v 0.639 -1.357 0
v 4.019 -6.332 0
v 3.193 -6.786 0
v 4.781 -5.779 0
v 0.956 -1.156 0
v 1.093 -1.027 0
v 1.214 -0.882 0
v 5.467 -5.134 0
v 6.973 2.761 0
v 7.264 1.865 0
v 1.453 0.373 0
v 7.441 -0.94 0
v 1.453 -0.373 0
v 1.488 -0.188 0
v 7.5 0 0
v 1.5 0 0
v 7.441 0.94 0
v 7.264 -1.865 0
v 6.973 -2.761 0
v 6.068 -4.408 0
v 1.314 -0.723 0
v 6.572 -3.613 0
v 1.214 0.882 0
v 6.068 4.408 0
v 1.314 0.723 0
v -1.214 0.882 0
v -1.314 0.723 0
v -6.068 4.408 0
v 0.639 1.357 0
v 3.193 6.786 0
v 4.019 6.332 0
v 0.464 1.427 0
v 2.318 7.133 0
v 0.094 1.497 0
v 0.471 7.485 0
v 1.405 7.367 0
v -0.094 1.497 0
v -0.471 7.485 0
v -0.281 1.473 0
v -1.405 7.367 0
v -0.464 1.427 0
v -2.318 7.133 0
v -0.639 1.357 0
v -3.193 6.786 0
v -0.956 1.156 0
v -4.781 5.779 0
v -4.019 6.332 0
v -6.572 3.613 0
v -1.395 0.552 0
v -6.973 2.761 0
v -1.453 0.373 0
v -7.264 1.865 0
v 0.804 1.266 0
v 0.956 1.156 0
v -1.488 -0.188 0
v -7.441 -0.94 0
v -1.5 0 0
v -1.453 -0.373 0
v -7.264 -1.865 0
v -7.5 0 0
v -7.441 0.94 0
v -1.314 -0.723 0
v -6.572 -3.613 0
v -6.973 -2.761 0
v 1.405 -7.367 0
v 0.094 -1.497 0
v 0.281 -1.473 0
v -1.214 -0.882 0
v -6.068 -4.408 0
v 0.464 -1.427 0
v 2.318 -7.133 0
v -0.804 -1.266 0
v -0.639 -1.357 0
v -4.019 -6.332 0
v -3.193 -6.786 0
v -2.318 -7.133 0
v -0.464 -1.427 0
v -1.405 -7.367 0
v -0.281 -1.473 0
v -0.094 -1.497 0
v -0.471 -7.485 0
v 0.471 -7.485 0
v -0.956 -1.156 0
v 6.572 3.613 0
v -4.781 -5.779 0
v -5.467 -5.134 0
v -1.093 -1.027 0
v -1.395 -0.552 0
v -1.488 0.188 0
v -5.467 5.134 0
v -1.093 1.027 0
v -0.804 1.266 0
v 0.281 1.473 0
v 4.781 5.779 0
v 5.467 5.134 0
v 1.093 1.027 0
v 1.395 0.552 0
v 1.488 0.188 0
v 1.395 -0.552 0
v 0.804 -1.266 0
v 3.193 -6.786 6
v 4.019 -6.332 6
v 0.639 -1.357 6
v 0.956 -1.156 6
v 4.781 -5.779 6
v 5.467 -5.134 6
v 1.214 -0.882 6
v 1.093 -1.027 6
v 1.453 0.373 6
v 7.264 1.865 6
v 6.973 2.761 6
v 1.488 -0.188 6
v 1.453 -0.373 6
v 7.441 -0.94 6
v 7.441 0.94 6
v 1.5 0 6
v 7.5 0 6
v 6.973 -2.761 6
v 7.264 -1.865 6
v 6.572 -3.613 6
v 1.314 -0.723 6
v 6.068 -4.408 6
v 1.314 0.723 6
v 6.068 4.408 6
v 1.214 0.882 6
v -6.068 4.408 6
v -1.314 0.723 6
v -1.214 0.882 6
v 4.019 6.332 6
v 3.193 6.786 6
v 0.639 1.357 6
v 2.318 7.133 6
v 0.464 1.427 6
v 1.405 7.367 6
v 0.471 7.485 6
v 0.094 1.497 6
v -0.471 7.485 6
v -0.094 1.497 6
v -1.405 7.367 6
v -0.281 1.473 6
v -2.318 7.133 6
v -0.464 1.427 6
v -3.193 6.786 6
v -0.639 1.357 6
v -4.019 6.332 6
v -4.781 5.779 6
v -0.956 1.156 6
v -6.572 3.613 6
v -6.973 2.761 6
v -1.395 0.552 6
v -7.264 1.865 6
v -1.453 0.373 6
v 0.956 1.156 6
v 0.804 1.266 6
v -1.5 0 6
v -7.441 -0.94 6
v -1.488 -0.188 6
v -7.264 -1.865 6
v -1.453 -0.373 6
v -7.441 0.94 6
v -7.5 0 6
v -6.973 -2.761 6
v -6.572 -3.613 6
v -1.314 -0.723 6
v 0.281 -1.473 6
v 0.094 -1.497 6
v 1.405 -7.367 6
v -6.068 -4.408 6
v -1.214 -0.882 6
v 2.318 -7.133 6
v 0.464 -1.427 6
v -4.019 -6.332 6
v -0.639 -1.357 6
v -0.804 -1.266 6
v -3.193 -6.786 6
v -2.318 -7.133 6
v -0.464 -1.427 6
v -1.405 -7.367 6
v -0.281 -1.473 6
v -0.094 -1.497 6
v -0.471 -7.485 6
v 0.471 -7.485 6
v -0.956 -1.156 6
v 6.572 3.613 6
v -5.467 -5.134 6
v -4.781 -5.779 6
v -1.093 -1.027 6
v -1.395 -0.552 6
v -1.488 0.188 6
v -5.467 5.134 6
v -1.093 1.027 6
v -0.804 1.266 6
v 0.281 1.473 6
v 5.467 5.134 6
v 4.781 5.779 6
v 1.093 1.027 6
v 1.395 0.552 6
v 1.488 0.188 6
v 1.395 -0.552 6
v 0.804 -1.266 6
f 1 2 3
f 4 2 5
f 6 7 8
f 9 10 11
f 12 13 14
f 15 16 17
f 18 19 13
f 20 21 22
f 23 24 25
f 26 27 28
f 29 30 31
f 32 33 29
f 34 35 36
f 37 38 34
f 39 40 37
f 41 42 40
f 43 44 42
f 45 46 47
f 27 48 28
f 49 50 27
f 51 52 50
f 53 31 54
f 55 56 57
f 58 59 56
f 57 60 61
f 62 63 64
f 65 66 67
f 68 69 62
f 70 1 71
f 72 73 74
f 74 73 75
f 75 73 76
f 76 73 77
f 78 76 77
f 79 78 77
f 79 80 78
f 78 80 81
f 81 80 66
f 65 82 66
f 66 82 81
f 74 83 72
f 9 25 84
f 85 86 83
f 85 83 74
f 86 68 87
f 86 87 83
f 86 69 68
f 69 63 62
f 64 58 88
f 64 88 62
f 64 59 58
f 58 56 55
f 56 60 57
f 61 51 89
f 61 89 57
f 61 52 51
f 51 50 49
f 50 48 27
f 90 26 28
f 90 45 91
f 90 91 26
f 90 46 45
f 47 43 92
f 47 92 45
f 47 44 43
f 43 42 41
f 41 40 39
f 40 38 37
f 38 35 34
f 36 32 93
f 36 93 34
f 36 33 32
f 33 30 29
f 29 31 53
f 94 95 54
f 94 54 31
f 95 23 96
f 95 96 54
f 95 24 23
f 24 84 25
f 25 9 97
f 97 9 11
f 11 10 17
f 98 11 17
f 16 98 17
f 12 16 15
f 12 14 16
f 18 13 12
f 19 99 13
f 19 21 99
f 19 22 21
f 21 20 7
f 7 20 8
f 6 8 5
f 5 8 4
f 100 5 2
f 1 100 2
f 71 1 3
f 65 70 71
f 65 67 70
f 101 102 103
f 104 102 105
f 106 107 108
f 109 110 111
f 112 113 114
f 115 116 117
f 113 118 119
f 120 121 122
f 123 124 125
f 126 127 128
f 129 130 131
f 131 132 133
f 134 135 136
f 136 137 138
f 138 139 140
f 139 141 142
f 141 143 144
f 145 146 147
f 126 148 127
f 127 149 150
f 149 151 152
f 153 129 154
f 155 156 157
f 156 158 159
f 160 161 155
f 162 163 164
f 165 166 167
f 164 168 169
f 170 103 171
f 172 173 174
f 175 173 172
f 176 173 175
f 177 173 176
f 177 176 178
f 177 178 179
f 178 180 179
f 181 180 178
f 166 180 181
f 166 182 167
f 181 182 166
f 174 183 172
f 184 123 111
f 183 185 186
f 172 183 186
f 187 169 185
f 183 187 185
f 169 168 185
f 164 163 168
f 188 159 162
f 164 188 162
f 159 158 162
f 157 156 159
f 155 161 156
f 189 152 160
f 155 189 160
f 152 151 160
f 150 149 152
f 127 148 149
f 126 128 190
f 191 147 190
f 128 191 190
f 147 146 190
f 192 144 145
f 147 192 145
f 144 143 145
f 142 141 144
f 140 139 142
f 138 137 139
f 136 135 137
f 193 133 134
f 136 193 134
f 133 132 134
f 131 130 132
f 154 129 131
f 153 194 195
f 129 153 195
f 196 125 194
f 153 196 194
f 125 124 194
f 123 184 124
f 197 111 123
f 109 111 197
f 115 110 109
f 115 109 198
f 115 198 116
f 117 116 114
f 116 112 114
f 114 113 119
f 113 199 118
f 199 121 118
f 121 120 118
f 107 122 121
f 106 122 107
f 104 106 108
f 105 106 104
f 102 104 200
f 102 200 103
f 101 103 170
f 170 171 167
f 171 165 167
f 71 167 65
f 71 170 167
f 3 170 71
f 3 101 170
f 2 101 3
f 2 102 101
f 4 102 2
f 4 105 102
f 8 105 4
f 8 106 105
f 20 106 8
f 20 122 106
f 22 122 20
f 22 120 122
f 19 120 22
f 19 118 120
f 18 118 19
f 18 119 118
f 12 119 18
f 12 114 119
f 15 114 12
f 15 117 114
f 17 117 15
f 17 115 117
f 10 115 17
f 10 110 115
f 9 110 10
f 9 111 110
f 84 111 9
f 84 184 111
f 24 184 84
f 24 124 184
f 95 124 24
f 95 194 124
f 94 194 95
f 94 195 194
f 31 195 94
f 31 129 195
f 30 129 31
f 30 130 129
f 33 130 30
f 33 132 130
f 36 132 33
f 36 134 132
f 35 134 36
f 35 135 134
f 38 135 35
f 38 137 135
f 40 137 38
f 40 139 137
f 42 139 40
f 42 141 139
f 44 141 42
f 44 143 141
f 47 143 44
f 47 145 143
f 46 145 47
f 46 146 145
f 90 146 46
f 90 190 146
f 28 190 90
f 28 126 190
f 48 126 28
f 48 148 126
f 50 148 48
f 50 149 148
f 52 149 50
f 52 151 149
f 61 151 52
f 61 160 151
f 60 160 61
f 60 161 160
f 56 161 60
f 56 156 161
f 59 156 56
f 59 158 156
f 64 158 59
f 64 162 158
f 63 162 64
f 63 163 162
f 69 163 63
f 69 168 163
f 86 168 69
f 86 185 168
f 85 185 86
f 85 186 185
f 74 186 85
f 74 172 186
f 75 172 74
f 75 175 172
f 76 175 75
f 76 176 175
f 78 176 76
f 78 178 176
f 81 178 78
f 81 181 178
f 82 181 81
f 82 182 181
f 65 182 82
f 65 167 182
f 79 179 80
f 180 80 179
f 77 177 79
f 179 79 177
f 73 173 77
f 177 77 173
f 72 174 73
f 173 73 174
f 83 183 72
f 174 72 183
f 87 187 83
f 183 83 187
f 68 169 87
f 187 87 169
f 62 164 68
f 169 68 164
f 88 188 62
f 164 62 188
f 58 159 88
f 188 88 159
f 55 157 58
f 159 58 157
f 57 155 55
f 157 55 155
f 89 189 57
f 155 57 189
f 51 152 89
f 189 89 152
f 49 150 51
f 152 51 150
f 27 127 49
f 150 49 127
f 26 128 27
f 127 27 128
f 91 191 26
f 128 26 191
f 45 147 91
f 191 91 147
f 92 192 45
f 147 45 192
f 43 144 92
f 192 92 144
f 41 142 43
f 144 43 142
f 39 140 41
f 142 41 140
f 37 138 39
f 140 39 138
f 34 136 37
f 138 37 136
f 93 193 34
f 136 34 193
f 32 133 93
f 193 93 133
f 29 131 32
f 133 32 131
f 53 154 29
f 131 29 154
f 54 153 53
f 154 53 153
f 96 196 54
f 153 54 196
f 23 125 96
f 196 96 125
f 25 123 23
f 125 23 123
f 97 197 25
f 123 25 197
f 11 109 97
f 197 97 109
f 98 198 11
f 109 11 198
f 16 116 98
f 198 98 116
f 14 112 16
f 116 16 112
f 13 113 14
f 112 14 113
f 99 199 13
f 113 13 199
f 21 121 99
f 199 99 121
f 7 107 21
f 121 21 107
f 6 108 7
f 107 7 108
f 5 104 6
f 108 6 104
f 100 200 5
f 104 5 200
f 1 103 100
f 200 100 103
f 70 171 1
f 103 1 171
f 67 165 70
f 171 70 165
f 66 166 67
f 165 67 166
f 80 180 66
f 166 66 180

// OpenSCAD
// file: ../lib/utils.scad
include <params.scad>;

function tol(val) = val - tolerance;

module cone(r, angle, invert=false) {
    h = tan((180 - angle) / 2) * r;
    translate([0, 0, -h]) {
        if (invert) {
                cylinder(r1=r,r2=0,h=h, $fn=20); 
        } else {
            cylinder(r1=0,r2=r,h=h, $fn=20); 
        }
    }
}

module roundrect(vect, r, $fn=20) {
    sq = len(vect) > 1
        ? [for (i = [0:1:len(vect)-1]) vect[i] - r * 2]
        : vect - r * 2;
    minkowski() {
        square(sq);
        translate([r, r])
            circle(r=r);
    }
}

module profile($fn=20) {
    minkowski() {
        translate([fan_case_radius, fan_case_radius, 0])
            square(fan_case - fan_case_radius * 2);
        circle(fan_case_radius, $fn);
    }
}

module fan_mount_points(radius, $fn=20) {
    offset = (fan_case - fan_screw_distance) / 2;
    translate([offset, offset, 0]) {
        circle(radius, $fn);
        translate([fan_screw_distance, 0, 0])
            circle(radius, $fn);
        translate([fan_screw_distance, fan_screw_distance, 0])
            circle(radius, $fn);
        translate([0, fan_screw_distance, 0])
            circle(radius, $fn);
    }
}

module square_grill(width, height, fin_width, fin_count) {
    fin_spacing = width / fin_count;
    difference() {
        square(width);
        union() {
            for (i = [0:1:fin_count]) {
                translate([(i + 1) * fin_spacing - (fin_spacing / 2) - (fin_width / 2), 0, 0])
                    square([fin_width, height]);
            }
        }
    }
}

module bushing(outer_r, inner_r, h) {
    linear_extrude(h)
        difference() {
            circle(r=outer_r);
            circle(r=inner_r);
        }
}

module screw_at_origin(r, d, l, head, head_d, cap, angle) {
    translate([0, 0, -l])
        screw(r, d, l, head, head_d, cap, angle);
}

module screw(r, d, l, head, head_d, cap, angle, fn=20, head_fn) {
    radius = r > 0 ? r : d / 2;
    head_r = head > 0 ? head : head_d / 2;
    hfn = head_fn ? head_fn : fn;

    union() {
        if (angle) {
            translate([0, 0, l])
                cone(head_r, angle, false);
        }
        linear_extrude(l)
            circle(r=radius, $fn=fn);
        if (cap > 0) {
            translate([0, 0, l - cap])
                linear_extrude(cap)
                    circle(r=head_r, $fn=hfn);
        }
    }
}

module inset_screw(r, d, l, head, head_d, cap, angle, inset, fn=20, head_fn) {
    screw_height = l - inset;
    head_r = head > 0 ? head : head_d / 2;

    union() {
        screw(
            r=r,
            d=d,
            l=screw_height,
            head=head_r,
            cap=cap,
            angle=angle,
            fn=fn,
            head_fn=head_fn
        );
        translate([0, 0, screw_height])
            linear_extrude(inset)
                circle(r=head_r, $fn=fn);
    }
}

function inch_to_mm(inches) = inches * 25.4;
// file: ../lib/params.scad
fan_case = 120;
fan_screw_distance = 105;
fan_case_depth = 25;
fan_case_radius = 5;
fan_case_screw_radius = 2.5;
fan_case_socket_cap_radius = 5.6 / 2;
fan_case_screw_head_radius = 3;
fan_case_screw_head_angle = 90;

grill_screw_size = 3;
grill_screw_radius = grill_screw_size / 2;
grill_screw_inset = 2;
grill_radius = 114 / 2;
grill_fin_offset = 10;
grill_fin_thickness = 2;
grill_fin_degrees = 30;

rear_grill_thickness = 2;

front_grill_thickness = 2;
front_grill_fin_count = 6;
front_grill_fin_thickness = 2;

filter_thickness = 5;
filter_width = fan_screw_distance - fan_case_screw_radius * 3;
filter_offset = (fan_case - filter_width) / 2;

base_retainer_thickness = 2;
base_height = 30;
base_cut_offset = 10;
base_retainer_inset = 4;

adapter_thickness = 2;
adapter_duct_in = 4;
adapter_height = 14;
adapter_duct_height = 50;
flat_adapter_duct_height = 50;
flat_adapter_screw_radius = 2;
flat_adapter_screw_head_radius = 4;

caddy_thickness = 2;
caddy_handle_width = 20;
caddy_handle_depth = 10;
caddy_handle_grip_count = 5;
caddy_handle_grip_depth = 1;
caddy_handle_grip_width = 1;
caddy_clip_height = 2;
caddy_clip_depth = 6;
caddy_clip_offset = 1;

foot_lower_radius = 15;
foot_upper_radius = 20;
foot_height = 18;
foot_inset_radius = 4;
foot_inset_depth = 3;
foot_screw_radius = 4;
foot_screw_inset = 6;
foot_screw_head_radius = 8;

power_supply_case_thickness = 3.0;
power_supply_screw_radius = 1.5;
power_supply_bushing_radius = 7.5;

power_supply_cable_pass_width = 18;
power_supply_cable_pass_height = 5;
power_supply_cable_pass_overhang = 5;
power_supply_cable_pass_overhang_depth = power_supply_case_thickness;
power_supply_cable_pass_depth = 3;
power_supply_cable_pass_thickness = 3;

tolerance = 0.2;
// main file
include <../lib/params.scad>;
use <../lib/utils.scad>;

$fn=50;

bushing(
    power_supply_bushing_radius,
    power_supply_screw_radius,
    power_supply_case_thickness*2
);
